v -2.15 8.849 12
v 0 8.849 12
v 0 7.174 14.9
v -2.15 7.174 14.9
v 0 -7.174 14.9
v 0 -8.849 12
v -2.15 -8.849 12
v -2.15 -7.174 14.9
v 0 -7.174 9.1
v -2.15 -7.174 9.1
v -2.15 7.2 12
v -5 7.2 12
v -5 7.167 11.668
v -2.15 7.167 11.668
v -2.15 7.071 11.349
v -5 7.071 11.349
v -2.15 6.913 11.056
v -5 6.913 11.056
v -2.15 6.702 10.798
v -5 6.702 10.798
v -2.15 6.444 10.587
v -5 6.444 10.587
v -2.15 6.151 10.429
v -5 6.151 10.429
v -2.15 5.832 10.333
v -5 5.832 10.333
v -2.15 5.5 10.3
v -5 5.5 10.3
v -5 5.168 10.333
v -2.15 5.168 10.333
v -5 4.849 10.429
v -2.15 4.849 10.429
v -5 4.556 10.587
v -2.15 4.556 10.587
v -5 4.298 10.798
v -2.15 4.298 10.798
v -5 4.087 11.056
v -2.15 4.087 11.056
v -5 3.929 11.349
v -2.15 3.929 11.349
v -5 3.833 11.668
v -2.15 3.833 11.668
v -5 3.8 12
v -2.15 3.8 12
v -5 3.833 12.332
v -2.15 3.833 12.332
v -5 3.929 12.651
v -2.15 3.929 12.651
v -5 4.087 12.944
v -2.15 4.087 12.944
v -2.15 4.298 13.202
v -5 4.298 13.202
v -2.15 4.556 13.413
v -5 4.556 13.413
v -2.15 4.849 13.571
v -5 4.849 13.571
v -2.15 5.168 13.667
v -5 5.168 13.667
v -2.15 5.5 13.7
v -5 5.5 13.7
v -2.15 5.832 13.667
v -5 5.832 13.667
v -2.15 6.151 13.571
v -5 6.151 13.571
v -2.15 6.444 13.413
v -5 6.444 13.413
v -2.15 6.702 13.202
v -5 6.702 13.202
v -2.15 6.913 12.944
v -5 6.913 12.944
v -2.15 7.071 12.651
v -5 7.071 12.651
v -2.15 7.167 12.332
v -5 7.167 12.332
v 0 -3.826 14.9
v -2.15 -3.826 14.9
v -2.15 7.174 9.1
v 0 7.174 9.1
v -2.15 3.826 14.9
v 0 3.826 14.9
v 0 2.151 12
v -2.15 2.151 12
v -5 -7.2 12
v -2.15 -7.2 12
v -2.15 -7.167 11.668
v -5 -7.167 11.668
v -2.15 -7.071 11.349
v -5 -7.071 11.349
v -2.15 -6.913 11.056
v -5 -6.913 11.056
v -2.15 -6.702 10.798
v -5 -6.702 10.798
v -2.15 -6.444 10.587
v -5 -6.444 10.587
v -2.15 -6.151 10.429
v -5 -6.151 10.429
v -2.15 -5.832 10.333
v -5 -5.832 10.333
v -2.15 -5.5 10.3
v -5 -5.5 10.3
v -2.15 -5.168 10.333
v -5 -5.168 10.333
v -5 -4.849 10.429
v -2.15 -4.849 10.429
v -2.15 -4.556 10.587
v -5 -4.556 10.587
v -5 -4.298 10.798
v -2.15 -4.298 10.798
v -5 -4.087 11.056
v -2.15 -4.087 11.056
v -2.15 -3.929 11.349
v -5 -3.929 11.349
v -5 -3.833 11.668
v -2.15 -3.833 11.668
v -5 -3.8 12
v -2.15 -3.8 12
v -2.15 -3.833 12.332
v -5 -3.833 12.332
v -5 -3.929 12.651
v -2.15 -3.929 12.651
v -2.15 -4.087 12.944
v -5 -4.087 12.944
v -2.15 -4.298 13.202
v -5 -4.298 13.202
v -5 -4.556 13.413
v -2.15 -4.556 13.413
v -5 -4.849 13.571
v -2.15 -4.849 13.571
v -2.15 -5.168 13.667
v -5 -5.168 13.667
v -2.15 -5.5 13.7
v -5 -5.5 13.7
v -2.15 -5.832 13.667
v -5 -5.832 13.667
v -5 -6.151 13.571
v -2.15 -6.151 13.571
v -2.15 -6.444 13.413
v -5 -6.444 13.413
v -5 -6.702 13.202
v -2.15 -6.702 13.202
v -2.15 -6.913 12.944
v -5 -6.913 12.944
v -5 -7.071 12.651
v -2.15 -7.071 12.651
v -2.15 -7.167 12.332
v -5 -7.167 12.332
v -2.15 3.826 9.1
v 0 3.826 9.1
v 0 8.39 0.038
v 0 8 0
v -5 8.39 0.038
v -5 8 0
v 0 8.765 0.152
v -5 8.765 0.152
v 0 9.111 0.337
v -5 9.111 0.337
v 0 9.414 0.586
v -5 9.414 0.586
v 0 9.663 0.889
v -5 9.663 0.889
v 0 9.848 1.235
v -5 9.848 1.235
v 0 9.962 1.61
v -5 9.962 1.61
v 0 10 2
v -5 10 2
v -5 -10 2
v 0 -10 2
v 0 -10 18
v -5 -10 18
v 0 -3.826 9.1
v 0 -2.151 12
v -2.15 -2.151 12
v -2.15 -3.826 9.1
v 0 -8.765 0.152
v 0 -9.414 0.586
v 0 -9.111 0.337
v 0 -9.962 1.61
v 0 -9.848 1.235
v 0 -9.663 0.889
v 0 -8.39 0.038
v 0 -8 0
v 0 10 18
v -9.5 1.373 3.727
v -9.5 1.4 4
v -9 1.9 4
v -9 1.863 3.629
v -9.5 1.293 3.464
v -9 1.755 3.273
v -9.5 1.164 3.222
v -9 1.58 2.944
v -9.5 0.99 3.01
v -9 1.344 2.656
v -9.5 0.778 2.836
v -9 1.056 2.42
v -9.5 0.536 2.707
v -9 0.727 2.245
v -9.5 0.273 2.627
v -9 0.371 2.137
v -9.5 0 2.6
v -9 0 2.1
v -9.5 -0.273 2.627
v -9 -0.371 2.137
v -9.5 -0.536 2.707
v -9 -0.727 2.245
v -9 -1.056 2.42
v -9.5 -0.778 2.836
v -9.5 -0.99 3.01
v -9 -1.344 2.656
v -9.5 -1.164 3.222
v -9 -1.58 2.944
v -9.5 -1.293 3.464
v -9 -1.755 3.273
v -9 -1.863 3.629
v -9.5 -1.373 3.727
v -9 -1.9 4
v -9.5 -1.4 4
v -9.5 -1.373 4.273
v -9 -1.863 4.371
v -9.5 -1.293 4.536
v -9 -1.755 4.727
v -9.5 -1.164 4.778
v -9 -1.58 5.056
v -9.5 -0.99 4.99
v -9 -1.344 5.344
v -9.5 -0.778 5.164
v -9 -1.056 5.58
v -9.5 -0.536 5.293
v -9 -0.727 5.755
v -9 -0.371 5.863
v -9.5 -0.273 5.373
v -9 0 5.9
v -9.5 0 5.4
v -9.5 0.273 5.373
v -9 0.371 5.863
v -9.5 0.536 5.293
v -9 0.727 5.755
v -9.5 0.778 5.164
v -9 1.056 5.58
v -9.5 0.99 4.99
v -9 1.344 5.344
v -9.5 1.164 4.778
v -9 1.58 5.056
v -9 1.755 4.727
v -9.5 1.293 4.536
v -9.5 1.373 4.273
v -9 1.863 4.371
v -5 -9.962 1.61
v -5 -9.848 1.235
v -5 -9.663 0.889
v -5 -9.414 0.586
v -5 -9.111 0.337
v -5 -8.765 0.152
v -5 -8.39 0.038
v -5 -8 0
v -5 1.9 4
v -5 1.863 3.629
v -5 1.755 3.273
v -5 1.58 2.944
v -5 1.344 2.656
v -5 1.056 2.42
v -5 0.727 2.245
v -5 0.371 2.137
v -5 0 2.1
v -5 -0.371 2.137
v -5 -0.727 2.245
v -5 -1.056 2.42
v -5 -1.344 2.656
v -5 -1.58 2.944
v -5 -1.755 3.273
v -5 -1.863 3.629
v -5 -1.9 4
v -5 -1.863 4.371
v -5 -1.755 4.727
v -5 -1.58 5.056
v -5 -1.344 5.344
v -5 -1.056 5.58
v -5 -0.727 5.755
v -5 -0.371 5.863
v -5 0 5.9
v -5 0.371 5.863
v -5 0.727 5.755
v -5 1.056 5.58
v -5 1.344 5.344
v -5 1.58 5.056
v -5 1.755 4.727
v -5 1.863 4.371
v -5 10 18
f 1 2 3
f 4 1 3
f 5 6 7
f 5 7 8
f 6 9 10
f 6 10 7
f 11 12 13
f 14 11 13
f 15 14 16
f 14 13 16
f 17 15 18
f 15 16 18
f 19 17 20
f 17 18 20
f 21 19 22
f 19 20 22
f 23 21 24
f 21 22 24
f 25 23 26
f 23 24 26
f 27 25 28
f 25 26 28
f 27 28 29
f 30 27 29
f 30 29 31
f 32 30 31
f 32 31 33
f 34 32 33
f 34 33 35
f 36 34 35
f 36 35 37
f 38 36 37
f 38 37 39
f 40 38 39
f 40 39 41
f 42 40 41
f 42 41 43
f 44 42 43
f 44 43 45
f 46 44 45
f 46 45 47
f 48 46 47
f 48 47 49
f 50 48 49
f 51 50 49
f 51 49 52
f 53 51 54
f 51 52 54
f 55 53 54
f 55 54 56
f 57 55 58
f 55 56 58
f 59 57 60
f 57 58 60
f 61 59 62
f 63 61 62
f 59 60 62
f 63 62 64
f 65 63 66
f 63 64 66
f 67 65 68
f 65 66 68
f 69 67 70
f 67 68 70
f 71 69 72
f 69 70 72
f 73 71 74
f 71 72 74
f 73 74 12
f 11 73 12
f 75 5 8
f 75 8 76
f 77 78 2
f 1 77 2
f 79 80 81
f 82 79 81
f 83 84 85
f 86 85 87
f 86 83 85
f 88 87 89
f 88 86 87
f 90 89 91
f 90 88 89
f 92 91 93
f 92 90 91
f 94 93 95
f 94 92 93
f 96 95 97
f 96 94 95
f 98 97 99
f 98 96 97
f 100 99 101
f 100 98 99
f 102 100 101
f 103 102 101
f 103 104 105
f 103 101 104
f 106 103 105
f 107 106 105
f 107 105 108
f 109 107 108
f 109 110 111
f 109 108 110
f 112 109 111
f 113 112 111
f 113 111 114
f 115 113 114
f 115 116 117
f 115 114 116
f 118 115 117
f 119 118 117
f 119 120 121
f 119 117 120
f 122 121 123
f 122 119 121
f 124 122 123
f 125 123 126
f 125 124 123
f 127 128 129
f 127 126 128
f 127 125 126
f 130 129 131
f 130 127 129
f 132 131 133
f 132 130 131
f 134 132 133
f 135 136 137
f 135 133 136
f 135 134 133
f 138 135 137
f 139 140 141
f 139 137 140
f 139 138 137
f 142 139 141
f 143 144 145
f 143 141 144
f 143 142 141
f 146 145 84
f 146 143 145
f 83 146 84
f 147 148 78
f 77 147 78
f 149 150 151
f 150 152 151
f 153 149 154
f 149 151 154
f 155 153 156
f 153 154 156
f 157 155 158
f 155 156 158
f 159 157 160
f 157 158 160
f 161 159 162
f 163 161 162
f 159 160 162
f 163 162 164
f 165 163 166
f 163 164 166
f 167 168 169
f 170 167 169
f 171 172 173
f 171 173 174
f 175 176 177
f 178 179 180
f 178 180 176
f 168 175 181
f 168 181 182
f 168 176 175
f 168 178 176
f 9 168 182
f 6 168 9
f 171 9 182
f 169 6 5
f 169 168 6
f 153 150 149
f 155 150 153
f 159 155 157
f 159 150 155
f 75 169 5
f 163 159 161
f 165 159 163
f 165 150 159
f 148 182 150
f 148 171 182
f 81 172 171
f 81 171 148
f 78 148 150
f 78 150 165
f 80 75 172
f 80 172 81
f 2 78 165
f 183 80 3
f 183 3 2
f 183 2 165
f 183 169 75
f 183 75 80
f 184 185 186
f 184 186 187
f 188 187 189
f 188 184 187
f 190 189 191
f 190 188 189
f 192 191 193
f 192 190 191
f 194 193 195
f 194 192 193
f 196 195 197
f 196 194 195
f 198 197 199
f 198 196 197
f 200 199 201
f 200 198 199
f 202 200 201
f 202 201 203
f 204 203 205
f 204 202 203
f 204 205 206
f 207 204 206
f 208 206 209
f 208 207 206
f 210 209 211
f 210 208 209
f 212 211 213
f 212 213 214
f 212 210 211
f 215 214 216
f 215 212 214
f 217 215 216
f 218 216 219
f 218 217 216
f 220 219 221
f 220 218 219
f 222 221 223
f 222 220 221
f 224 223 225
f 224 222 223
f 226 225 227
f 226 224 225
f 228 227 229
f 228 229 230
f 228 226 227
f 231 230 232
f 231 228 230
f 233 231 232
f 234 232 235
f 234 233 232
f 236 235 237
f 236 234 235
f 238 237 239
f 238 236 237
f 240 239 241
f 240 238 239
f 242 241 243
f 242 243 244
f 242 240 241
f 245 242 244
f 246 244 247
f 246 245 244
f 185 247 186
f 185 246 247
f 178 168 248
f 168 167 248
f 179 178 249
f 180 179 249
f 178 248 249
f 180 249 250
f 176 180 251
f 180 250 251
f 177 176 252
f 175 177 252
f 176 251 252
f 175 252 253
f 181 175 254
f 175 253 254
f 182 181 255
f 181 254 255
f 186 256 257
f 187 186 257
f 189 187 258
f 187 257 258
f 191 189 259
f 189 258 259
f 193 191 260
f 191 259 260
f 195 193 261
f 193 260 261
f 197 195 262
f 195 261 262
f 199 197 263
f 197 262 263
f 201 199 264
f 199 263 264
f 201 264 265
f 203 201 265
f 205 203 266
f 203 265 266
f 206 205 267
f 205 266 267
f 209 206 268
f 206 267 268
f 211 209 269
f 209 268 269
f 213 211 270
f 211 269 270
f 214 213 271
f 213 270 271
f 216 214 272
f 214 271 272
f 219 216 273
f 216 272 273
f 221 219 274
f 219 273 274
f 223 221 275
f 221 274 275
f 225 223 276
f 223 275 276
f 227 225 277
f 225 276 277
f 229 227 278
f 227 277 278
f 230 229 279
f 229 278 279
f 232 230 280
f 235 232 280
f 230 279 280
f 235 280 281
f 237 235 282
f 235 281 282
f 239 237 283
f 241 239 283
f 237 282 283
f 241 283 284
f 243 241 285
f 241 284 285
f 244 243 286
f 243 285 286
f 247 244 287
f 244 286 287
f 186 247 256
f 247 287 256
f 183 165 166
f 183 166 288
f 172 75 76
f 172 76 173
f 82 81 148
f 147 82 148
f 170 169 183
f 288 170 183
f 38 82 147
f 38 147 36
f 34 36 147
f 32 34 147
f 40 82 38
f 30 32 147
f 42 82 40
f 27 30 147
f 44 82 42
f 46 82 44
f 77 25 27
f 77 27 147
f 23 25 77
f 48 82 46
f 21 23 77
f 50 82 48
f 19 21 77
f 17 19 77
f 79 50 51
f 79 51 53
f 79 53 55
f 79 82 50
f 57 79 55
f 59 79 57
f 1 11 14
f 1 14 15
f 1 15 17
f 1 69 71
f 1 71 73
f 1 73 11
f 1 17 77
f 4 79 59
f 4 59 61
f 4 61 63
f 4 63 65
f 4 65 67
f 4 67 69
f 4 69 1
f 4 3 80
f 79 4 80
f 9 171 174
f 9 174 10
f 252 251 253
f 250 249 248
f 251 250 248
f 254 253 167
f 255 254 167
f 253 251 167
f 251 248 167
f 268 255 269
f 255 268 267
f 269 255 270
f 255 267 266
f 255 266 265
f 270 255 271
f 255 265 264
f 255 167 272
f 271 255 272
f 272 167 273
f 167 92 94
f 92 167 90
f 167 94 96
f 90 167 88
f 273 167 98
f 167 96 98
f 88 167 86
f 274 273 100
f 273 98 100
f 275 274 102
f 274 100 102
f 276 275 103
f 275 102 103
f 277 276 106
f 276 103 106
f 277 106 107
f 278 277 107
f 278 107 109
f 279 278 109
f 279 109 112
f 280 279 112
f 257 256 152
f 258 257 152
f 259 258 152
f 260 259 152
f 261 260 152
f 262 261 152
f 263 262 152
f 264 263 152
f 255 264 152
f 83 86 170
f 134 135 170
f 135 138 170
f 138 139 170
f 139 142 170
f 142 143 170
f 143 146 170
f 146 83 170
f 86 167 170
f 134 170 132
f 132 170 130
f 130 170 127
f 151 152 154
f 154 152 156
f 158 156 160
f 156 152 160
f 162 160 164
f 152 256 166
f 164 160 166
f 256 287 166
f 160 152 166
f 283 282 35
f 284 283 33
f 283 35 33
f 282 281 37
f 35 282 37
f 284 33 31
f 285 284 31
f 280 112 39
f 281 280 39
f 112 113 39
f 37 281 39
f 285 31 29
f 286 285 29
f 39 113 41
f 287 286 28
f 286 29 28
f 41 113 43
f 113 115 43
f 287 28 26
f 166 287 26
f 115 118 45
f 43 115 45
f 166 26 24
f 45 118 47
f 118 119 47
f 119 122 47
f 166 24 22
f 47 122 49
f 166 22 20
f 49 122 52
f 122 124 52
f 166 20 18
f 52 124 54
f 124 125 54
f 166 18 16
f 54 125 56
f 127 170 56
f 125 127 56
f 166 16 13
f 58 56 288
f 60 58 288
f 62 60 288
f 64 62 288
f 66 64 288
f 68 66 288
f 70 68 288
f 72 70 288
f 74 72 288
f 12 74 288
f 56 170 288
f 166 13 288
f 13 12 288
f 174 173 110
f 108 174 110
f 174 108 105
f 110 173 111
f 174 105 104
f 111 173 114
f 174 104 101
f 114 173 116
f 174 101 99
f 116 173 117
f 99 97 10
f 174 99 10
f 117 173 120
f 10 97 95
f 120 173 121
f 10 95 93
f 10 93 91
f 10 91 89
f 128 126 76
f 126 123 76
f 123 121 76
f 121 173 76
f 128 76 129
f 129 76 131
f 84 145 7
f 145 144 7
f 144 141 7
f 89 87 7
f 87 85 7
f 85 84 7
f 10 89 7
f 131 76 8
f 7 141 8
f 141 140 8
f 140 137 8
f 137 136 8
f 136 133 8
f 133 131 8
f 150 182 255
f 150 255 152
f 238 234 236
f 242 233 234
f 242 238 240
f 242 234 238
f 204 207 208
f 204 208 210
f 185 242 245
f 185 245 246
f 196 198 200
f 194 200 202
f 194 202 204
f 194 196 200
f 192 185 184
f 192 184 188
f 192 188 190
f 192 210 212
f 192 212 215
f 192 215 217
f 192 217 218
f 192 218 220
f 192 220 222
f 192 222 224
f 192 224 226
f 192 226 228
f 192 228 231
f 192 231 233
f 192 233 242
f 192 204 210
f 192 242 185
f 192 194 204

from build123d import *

# Parameters (mm, degrees)
SKETCH_W     = 20
SKETCH_H     = 18
PAD_DEPTH    = 5
SKETCH001_R  = 1.9
PAD001_DEPTH = 4.5
SKETCH002_R  = 1.7
HOLE_DEPTH   = 62.0711322935
POCKET_DEPTH = 2.15
CHAMFER_SIZE = 0.5
FILLET001_R  = 2


with BuildPart() as part:
    # Sketch → Pad (new body)
    with BuildSketch(Plane.YZ):
        with Locations((0, 9)):
            Rectangle(SKETCH_W, SKETCH_H)
    extrude(amount=-PAD_DEPTH)

    # Sketch001 (on Face6 of Pad) → Pad001 (join)
    with BuildSketch(Plane(origin=(-5, 0, 0), x_dir=(0, 1, 0), z_dir=(-1, 0, 0))):
        with Locations((0, -4)):
            Circle(SKETCH001_R)
    extrude(amount=PAD001_DEPTH)

    # Sketch002 (on Face5 of Pad001) → Hole (cut, through all)
    with BuildSketch(Plane(origin=(-5, 0, 0), x_dir=(0, 1, 0), z_dir=(-1, 0, 0))):
        with Locations((5.5, -12)):
            Circle(SKETCH002_R)
    hole = extrude(amount=-HOLE_DEPTH, mode=Mode.SUBTRACT)

    # Sketch003 (on Face4 of Hole) → Pocket (cut)
    with BuildSketch(Plane.YZ):
        Polygon((2.1513684387, 12), (3.8256842194, 9.1), (7.1743157806, 9.1), (8.8486315613, 12), (7.1743157806, 14.9), (3.8256842194, 14.9), align=None)
    pocket = extrude(amount=-POCKET_DEPTH, mode=Mode.SUBTRACT)

    # Mirrored: Hole, Pocket across XZ
    add(hole.mirror(Plane.XZ), mode=Mode.SUBTRACT)
    add(pocket.mirror(Plane.XZ), mode=Mode.SUBTRACT)

    # Chamfer
    chamfer_edges = [part.edges().sort_by_distance(p)[0] for p in [
        (-9.5, -1.9, 4),
    ]]
    chamfer(chamfer_edges, length=CHAMFER_SIZE)

    # Fillet001
    fillet001_edges = [part.edges().sort_by_distance(p)[0] for p in [
        (-2.5, 10, 0),
        (-2.5, -10, 0),
    ]]
    fillet(fillet001_edges, radius=FILLET001_R)


solid = part.part
